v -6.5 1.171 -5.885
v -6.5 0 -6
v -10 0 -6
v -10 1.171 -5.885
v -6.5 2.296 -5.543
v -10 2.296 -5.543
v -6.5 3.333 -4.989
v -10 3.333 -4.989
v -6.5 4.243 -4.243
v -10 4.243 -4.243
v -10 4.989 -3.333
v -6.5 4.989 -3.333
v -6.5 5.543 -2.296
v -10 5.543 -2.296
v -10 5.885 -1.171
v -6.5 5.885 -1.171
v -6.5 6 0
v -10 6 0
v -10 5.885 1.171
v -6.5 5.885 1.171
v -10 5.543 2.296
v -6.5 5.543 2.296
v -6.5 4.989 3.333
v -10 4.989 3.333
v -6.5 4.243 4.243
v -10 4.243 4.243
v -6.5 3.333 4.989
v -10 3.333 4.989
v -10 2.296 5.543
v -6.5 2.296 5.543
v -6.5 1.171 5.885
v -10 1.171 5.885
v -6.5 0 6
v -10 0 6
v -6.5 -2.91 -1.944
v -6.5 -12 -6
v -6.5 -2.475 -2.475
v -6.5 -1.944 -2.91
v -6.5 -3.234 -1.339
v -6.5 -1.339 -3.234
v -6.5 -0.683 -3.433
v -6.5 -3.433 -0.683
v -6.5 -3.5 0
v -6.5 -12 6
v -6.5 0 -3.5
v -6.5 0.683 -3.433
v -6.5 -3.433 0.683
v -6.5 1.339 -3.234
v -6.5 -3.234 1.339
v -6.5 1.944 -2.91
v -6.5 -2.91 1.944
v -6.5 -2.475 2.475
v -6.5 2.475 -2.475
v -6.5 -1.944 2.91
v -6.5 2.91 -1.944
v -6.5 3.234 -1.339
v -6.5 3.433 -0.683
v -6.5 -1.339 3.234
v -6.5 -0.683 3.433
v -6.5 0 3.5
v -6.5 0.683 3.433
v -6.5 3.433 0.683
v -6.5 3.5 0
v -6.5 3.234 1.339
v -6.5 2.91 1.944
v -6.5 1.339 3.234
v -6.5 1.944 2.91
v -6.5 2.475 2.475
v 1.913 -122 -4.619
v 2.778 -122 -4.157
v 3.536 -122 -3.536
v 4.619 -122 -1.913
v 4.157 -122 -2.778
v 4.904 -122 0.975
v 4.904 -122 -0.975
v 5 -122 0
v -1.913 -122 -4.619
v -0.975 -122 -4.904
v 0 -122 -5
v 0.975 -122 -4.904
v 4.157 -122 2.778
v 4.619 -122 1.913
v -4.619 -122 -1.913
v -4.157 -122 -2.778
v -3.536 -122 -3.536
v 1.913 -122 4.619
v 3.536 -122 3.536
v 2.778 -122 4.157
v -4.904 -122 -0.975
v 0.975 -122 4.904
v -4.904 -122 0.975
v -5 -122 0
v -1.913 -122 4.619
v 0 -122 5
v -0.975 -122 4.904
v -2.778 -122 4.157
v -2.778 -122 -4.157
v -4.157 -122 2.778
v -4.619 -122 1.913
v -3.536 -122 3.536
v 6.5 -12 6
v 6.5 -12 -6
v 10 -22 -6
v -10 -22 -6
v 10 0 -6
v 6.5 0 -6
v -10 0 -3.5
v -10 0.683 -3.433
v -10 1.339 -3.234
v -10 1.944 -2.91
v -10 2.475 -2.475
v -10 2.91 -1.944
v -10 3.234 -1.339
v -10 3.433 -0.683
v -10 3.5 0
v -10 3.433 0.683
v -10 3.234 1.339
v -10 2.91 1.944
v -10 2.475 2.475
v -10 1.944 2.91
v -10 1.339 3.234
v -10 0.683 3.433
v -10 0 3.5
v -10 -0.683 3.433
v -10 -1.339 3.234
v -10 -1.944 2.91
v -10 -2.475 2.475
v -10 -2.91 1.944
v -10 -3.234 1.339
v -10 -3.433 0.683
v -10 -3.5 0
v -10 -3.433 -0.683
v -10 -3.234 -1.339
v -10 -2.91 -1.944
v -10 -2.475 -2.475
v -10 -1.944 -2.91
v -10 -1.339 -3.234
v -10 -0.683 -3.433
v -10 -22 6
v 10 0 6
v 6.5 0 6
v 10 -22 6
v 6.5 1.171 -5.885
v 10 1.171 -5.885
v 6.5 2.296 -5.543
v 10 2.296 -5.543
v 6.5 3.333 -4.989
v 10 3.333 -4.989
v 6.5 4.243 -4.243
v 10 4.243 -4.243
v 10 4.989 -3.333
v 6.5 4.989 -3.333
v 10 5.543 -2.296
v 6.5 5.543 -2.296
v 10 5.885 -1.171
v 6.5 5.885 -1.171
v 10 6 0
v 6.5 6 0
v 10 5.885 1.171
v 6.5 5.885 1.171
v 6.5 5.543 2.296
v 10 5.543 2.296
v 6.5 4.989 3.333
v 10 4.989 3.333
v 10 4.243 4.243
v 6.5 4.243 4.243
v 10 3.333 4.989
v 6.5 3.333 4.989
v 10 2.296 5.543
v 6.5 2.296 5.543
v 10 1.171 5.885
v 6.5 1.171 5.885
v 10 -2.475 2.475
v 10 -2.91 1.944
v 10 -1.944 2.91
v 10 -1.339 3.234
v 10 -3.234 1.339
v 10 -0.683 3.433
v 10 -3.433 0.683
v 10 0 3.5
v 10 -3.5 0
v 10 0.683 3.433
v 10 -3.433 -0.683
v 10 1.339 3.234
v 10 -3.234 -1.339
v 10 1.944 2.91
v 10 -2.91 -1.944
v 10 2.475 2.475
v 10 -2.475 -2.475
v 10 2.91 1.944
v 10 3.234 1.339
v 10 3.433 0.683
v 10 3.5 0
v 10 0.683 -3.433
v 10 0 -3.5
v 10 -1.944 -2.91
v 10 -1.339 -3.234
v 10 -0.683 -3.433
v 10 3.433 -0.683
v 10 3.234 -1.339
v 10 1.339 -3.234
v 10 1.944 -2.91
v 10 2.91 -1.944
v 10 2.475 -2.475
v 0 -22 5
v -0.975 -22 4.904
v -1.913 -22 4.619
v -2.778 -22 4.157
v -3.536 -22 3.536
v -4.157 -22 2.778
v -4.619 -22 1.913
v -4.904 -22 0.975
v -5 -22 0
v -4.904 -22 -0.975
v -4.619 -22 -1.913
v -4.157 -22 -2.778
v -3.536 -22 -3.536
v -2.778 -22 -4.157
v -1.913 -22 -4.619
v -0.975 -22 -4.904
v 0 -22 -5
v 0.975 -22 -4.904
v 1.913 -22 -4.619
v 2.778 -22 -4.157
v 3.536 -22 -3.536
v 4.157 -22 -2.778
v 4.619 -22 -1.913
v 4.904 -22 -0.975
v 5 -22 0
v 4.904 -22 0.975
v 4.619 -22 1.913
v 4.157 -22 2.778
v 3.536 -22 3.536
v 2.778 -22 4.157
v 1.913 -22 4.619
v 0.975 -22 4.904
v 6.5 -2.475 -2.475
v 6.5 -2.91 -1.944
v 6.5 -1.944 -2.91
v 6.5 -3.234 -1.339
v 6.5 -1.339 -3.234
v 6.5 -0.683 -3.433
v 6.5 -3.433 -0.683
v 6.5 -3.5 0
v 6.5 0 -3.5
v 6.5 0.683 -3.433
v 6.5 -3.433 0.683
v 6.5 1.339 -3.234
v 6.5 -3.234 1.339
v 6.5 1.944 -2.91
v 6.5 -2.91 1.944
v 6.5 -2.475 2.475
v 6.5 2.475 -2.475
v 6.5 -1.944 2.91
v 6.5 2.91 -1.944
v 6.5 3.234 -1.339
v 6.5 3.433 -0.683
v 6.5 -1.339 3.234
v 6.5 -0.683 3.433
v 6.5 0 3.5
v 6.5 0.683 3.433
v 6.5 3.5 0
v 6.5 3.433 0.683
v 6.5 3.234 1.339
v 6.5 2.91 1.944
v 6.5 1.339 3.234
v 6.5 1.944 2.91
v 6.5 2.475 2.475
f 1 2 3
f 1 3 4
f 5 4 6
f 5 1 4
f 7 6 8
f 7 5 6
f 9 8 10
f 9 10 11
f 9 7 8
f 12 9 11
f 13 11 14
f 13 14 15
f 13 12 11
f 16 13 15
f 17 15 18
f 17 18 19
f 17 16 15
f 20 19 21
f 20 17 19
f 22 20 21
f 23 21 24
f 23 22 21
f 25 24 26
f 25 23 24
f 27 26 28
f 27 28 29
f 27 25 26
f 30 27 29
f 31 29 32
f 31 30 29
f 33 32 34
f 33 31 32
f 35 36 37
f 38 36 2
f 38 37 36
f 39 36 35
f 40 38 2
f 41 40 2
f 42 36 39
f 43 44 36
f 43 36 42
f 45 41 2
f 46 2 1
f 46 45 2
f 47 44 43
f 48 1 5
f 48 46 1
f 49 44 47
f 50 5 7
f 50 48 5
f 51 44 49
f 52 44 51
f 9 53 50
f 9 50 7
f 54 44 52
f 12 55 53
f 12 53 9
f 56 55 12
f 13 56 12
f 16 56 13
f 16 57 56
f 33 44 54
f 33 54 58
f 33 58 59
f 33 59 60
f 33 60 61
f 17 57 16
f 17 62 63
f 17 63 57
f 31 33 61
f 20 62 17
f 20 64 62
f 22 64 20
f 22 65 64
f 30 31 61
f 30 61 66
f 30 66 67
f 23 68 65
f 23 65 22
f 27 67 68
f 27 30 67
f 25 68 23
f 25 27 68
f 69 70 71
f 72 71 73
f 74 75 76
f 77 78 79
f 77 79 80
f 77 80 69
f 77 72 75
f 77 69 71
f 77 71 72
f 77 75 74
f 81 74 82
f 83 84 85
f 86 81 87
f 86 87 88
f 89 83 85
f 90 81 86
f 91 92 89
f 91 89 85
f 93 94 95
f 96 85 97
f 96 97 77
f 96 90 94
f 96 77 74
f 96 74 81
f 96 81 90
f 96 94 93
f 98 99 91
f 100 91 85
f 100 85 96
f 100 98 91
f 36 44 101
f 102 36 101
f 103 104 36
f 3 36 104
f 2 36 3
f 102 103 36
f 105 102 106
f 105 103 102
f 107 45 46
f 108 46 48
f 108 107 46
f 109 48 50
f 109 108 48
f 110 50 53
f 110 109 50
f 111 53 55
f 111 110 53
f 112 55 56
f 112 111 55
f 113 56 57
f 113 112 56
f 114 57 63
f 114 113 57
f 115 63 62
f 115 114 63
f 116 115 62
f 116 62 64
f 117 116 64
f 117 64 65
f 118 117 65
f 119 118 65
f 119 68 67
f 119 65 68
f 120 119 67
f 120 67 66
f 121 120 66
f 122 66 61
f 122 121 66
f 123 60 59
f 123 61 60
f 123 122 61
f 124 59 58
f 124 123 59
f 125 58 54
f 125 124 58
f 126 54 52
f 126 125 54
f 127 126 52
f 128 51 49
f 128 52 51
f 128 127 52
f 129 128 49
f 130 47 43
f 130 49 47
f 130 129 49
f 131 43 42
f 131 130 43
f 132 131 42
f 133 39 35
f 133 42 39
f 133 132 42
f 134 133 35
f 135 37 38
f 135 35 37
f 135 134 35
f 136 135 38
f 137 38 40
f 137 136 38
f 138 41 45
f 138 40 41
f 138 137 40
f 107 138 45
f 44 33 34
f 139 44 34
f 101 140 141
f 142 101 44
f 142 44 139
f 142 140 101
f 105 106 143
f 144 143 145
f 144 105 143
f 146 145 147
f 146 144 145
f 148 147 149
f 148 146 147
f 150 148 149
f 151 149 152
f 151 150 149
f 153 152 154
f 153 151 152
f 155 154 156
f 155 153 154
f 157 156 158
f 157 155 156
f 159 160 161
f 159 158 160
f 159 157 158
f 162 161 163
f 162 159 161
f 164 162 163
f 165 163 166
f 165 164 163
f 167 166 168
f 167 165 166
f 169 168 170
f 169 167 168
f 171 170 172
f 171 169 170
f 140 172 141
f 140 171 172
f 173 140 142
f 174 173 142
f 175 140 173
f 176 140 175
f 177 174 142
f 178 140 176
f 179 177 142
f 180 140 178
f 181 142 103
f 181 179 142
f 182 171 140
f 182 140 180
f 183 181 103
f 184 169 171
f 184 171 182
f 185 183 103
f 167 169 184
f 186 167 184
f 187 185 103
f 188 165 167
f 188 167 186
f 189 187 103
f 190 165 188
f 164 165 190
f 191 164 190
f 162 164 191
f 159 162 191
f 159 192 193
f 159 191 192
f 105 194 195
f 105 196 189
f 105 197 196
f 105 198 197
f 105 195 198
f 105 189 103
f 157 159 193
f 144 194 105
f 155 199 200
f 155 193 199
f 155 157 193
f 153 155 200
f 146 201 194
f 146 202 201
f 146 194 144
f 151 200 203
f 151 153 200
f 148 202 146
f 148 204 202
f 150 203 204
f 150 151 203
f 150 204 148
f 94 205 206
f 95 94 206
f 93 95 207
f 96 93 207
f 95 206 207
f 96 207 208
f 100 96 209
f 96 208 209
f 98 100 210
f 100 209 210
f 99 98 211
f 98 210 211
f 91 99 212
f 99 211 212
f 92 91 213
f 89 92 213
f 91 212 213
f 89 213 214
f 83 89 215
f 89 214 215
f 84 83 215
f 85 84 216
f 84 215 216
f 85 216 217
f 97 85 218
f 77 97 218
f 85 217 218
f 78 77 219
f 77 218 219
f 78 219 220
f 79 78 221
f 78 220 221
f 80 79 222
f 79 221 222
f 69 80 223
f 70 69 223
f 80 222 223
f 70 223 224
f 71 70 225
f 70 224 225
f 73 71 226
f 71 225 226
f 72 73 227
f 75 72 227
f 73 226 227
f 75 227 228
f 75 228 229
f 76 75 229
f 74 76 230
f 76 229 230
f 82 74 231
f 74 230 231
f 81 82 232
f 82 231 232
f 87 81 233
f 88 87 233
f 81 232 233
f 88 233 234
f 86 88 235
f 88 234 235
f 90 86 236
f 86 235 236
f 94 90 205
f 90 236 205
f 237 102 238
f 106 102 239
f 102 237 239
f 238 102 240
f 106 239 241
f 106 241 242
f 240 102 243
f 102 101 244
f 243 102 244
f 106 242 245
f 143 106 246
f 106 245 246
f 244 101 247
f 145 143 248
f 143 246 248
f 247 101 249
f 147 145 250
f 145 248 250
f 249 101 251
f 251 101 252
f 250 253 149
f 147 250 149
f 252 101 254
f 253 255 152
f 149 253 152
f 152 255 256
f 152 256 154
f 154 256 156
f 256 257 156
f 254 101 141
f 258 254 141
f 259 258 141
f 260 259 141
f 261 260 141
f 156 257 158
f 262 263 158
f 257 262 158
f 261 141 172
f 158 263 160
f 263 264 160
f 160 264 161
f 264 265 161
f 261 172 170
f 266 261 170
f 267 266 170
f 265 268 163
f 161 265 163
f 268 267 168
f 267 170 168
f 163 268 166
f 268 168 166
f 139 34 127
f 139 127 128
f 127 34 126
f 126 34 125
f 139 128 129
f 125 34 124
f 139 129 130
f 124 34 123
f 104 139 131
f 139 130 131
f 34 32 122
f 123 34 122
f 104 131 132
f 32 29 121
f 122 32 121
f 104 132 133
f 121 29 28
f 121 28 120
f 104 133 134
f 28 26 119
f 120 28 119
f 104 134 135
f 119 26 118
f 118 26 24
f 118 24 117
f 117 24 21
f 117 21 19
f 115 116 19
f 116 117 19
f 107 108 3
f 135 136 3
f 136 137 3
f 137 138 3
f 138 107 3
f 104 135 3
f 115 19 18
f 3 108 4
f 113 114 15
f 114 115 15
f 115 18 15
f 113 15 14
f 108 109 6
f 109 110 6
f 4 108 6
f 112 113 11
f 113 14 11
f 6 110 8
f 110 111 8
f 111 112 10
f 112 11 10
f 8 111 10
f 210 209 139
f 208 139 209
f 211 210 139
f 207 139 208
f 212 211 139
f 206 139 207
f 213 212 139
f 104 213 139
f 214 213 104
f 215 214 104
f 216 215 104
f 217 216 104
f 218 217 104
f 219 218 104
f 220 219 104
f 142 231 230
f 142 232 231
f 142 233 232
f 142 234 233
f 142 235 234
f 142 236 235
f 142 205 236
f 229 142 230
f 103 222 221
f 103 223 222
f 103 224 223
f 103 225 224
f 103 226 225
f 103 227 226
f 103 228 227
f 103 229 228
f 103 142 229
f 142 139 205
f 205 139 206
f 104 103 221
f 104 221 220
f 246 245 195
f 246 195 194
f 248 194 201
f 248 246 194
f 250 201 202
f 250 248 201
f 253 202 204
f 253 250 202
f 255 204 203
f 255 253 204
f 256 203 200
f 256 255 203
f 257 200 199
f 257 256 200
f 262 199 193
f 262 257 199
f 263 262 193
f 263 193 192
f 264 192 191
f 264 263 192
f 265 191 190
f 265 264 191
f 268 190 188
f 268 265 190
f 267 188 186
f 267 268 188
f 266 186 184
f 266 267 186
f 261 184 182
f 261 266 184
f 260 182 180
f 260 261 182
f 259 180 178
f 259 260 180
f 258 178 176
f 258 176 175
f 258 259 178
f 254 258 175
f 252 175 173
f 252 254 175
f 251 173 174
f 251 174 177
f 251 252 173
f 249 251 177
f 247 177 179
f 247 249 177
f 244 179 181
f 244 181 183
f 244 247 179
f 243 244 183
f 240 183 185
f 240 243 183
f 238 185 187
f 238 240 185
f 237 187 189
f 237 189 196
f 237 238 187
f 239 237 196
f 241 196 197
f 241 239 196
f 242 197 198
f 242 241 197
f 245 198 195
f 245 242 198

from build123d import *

# Parameters (mm, degrees)
ESBO_O1_R                = 3.5
RESSALTO_EXTRUS_O1_DEPTH = 10
ESBO_O3_W                = 13
ESBO_O3_H                = 18
CORTE_EXTRUS_O2_DEPTH    = 10
ESBO_O4_R                = 5
RESSALTO_EXTRUS_O2_DEPTH = 100


with BuildPart() as part:
    # Esboço1 → Ressalto-extrusão1 (new, symmetric)
    with BuildSketch(Plane(origin=(0, 0, 0), x_dir=(0, 0, -1), z_dir=(1, 0, 0))):
        with BuildLine():
            Line((-6, 0), (-6, -22))
            Line((-6, -22), (6, -22))
            Line((6, -22), (6, 0))
            ThreePointArc((6, 0), (0, 6), (-6, 0))
        make_face()
        Circle(ESBO_O1_R, mode=Mode.SUBTRACT)
    extrude(amount=RESSALTO_EXTRUS_O1_DEPTH, both=True)

    # Esboço3 → Corte-extrusão2 (cut, symmetric)
    with BuildSketch(Plane.XY):
        with Locations((0, -3)):
            Rectangle(ESBO_O3_W, ESBO_O3_H)
    extrude(amount=CORTE_EXTRUS_O2_DEPTH, both=True, mode=Mode.SUBTRACT)

    # Esboço4 → Ressalto-extrusão2 (add)
    with BuildSketch(Plane.XZ.offset(22)):
        with Locations(Location((0, 0, 0), (0, 0, 90))):
            Circle(ESBO_O4_R)
    extrude(amount=RESSALTO_EXTRUS_O2_DEPTH)


solid = part.part
